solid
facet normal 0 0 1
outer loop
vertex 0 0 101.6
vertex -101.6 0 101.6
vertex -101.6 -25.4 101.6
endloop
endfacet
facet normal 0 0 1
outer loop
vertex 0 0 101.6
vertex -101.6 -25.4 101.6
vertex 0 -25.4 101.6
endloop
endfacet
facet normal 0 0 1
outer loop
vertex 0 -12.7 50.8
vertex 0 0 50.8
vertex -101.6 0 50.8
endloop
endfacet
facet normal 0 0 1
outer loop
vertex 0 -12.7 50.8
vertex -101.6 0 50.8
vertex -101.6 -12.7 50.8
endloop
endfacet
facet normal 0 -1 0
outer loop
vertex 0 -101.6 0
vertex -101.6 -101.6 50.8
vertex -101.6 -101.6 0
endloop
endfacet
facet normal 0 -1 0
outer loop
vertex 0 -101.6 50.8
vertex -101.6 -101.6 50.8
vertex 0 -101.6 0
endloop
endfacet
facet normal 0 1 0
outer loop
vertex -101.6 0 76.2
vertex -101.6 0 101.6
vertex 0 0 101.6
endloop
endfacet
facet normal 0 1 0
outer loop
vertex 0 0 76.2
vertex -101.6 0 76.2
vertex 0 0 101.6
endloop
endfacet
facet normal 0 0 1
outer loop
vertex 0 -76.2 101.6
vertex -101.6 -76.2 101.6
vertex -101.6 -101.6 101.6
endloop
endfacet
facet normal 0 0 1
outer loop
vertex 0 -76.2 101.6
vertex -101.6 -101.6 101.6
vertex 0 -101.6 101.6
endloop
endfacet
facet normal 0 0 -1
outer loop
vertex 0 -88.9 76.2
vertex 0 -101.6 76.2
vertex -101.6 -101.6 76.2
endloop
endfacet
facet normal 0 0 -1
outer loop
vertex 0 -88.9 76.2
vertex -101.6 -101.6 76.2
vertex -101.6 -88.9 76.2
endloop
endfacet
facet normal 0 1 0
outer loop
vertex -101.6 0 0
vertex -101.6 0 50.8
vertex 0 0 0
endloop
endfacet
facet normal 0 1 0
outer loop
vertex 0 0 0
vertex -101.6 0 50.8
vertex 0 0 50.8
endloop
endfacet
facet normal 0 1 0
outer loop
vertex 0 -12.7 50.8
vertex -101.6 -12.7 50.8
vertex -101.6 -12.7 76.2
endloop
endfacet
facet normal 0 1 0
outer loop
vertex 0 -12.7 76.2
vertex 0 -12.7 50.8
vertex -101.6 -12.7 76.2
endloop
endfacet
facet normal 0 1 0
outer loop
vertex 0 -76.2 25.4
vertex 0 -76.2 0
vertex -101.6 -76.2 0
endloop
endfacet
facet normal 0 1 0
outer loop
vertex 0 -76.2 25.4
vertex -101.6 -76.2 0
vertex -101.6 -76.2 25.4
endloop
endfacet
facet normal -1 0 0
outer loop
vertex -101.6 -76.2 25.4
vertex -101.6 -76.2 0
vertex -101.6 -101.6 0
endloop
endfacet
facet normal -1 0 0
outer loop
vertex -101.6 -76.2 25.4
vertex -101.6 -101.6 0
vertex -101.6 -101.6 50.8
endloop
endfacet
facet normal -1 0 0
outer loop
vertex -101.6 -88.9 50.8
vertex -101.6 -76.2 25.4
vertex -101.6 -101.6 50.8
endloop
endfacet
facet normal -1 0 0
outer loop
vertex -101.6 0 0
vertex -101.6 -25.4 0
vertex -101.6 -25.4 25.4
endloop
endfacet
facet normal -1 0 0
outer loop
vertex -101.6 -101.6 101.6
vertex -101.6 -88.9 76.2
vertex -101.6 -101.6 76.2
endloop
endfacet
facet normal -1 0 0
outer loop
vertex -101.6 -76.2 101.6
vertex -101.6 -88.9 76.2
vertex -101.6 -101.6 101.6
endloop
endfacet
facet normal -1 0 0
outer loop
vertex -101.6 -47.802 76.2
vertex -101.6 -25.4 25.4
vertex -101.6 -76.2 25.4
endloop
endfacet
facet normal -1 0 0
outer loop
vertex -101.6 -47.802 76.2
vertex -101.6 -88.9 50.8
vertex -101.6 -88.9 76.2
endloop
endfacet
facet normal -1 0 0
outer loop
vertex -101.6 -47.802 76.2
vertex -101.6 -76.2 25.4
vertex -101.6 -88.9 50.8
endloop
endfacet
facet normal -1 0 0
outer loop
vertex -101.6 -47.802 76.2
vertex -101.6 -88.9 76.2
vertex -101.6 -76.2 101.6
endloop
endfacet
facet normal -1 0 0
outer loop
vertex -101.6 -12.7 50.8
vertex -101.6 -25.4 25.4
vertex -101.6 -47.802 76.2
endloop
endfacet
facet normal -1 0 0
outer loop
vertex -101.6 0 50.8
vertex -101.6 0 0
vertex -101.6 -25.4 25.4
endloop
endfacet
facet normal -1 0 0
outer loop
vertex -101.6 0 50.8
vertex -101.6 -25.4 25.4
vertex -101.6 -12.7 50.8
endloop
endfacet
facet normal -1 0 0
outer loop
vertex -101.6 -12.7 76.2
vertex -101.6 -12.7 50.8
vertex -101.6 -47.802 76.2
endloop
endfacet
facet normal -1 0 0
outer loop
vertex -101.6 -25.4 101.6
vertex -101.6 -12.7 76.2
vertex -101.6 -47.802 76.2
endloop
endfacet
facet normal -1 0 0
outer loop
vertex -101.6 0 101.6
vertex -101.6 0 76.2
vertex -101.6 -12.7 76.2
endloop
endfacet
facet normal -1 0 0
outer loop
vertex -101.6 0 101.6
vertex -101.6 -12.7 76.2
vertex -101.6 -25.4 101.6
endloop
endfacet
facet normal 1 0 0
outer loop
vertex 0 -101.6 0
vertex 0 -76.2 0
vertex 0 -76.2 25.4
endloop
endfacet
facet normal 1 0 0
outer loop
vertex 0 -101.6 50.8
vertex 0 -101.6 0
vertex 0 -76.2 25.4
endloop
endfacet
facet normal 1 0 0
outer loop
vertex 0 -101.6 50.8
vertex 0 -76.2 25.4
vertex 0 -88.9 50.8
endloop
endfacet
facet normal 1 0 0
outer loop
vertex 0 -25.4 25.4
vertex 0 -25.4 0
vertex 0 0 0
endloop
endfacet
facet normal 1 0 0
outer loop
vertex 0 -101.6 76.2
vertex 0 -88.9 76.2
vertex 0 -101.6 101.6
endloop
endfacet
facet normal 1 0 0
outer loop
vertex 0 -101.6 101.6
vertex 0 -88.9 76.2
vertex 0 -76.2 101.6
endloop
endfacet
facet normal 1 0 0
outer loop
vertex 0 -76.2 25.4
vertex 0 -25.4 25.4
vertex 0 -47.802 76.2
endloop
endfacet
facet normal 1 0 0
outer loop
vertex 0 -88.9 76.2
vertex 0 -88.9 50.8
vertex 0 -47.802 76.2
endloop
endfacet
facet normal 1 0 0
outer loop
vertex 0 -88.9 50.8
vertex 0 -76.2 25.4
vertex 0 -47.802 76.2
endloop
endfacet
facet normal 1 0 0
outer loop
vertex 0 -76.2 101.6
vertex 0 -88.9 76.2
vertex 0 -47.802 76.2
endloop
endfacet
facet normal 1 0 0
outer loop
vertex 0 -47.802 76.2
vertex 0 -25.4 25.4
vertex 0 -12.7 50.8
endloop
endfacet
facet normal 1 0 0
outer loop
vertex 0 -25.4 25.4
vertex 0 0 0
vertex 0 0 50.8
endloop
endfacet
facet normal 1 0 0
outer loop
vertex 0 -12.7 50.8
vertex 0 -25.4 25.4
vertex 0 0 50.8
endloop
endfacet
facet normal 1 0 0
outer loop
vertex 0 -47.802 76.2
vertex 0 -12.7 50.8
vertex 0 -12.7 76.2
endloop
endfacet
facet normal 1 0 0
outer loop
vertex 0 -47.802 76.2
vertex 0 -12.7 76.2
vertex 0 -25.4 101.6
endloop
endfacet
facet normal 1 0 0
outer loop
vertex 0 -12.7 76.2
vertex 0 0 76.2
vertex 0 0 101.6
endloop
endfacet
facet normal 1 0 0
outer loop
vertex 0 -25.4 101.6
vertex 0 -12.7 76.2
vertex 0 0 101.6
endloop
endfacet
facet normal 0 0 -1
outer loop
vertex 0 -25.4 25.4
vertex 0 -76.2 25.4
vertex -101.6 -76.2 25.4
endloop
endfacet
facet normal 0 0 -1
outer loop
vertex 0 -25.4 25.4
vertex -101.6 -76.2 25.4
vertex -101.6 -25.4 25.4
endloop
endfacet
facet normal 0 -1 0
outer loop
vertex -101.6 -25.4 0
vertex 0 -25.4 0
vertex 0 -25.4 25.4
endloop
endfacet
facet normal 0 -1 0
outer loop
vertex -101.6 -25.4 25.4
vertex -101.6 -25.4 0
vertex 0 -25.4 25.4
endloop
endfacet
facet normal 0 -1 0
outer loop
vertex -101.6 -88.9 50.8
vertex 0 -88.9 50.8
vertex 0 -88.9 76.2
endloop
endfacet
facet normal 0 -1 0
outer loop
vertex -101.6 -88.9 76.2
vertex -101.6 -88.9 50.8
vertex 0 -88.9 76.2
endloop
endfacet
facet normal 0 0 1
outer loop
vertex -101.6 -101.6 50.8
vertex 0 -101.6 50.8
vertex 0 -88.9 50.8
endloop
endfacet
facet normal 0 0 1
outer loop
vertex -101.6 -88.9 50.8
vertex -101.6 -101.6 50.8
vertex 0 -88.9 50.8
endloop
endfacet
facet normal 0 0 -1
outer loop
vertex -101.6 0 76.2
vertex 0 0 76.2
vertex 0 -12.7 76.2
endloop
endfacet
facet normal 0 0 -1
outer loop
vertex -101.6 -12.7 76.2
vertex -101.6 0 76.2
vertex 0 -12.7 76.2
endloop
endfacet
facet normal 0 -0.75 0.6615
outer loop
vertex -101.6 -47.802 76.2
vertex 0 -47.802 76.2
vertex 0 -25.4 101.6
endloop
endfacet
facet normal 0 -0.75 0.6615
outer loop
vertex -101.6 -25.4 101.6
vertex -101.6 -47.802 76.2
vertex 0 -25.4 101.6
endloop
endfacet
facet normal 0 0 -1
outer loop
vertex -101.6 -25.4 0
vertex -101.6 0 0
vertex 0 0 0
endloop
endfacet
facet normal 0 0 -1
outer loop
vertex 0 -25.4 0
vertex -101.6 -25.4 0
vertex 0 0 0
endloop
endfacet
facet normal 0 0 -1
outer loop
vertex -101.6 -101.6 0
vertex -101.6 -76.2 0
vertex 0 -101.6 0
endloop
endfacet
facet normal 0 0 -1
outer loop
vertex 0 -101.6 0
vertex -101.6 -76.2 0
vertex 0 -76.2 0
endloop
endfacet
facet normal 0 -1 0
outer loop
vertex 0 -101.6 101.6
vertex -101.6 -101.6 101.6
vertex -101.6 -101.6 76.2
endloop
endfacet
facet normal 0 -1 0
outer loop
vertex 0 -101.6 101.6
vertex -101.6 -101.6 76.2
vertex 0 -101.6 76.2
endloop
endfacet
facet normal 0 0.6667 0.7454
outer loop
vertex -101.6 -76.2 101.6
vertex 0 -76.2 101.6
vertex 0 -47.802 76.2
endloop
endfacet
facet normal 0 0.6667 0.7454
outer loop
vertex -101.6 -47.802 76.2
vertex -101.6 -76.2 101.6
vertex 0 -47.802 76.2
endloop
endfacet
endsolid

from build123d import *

# Parameters (mm, degrees)
F0_W     = 101.6
F0_H     = 101.6
F1_DEPTH = 101.6
F2_W     = 12.7
F2_H     = 25.4
F3_DEPTH = 101.6
F4_W     = 50.8
F4_H     = 25.4
F5_DEPTH = 127
F6_W     = 12.7
F6_H     = 25.4
F7_DEPTH = 101.6
F9_DEPTH = 1397


with BuildPart() as f1:
    # F0 (on Front) → F1 (new body)
    with BuildSketch(Plane.XZ):
        with Locations((-50.8, 50.8)):
            Rectangle(F0_W, F0_H)
    extrude(amount=F1_DEPTH)

    # F2 (on face) → F3 (cut)
    with BuildSketch(Plane.YZ):
        with Locations((-95.25, 63.5)):
            Rectangle(F2_W, F2_H)
    extrude(amount=-F3_DEPTH, mode=Mode.SUBTRACT)

    # F4 (on face) → F5 (cut)
    with BuildSketch(Plane.YZ):
        with Locations((-50.8, 12.7)):
            Rectangle(F4_W, F4_H)
    extrude(amount=-F5_DEPTH, mode=Mode.SUBTRACT)

    # F6 (on face) → F7 (cut)
    with BuildSketch(Plane(origin=(-101.6, 0, 0), x_dir=(0, -1, 0), z_dir=(-1, 0, 0))):
        with Locations((6.35, 63.5)):
            Rectangle(F6_W, F6_H)
    extrude(amount=-F7_DEPTH, mode=Mode.SUBTRACT)

    # F8 (on face) → F9 (cut)
    with BuildSketch(Plane.YZ):
        Polygon((-25.4, 101.6), (-76.2, 101.6), (-47.801937, 76.2), align=None)
    extrude(amount=-F9_DEPTH, mode=Mode.SUBTRACT)


solid = f1.part
